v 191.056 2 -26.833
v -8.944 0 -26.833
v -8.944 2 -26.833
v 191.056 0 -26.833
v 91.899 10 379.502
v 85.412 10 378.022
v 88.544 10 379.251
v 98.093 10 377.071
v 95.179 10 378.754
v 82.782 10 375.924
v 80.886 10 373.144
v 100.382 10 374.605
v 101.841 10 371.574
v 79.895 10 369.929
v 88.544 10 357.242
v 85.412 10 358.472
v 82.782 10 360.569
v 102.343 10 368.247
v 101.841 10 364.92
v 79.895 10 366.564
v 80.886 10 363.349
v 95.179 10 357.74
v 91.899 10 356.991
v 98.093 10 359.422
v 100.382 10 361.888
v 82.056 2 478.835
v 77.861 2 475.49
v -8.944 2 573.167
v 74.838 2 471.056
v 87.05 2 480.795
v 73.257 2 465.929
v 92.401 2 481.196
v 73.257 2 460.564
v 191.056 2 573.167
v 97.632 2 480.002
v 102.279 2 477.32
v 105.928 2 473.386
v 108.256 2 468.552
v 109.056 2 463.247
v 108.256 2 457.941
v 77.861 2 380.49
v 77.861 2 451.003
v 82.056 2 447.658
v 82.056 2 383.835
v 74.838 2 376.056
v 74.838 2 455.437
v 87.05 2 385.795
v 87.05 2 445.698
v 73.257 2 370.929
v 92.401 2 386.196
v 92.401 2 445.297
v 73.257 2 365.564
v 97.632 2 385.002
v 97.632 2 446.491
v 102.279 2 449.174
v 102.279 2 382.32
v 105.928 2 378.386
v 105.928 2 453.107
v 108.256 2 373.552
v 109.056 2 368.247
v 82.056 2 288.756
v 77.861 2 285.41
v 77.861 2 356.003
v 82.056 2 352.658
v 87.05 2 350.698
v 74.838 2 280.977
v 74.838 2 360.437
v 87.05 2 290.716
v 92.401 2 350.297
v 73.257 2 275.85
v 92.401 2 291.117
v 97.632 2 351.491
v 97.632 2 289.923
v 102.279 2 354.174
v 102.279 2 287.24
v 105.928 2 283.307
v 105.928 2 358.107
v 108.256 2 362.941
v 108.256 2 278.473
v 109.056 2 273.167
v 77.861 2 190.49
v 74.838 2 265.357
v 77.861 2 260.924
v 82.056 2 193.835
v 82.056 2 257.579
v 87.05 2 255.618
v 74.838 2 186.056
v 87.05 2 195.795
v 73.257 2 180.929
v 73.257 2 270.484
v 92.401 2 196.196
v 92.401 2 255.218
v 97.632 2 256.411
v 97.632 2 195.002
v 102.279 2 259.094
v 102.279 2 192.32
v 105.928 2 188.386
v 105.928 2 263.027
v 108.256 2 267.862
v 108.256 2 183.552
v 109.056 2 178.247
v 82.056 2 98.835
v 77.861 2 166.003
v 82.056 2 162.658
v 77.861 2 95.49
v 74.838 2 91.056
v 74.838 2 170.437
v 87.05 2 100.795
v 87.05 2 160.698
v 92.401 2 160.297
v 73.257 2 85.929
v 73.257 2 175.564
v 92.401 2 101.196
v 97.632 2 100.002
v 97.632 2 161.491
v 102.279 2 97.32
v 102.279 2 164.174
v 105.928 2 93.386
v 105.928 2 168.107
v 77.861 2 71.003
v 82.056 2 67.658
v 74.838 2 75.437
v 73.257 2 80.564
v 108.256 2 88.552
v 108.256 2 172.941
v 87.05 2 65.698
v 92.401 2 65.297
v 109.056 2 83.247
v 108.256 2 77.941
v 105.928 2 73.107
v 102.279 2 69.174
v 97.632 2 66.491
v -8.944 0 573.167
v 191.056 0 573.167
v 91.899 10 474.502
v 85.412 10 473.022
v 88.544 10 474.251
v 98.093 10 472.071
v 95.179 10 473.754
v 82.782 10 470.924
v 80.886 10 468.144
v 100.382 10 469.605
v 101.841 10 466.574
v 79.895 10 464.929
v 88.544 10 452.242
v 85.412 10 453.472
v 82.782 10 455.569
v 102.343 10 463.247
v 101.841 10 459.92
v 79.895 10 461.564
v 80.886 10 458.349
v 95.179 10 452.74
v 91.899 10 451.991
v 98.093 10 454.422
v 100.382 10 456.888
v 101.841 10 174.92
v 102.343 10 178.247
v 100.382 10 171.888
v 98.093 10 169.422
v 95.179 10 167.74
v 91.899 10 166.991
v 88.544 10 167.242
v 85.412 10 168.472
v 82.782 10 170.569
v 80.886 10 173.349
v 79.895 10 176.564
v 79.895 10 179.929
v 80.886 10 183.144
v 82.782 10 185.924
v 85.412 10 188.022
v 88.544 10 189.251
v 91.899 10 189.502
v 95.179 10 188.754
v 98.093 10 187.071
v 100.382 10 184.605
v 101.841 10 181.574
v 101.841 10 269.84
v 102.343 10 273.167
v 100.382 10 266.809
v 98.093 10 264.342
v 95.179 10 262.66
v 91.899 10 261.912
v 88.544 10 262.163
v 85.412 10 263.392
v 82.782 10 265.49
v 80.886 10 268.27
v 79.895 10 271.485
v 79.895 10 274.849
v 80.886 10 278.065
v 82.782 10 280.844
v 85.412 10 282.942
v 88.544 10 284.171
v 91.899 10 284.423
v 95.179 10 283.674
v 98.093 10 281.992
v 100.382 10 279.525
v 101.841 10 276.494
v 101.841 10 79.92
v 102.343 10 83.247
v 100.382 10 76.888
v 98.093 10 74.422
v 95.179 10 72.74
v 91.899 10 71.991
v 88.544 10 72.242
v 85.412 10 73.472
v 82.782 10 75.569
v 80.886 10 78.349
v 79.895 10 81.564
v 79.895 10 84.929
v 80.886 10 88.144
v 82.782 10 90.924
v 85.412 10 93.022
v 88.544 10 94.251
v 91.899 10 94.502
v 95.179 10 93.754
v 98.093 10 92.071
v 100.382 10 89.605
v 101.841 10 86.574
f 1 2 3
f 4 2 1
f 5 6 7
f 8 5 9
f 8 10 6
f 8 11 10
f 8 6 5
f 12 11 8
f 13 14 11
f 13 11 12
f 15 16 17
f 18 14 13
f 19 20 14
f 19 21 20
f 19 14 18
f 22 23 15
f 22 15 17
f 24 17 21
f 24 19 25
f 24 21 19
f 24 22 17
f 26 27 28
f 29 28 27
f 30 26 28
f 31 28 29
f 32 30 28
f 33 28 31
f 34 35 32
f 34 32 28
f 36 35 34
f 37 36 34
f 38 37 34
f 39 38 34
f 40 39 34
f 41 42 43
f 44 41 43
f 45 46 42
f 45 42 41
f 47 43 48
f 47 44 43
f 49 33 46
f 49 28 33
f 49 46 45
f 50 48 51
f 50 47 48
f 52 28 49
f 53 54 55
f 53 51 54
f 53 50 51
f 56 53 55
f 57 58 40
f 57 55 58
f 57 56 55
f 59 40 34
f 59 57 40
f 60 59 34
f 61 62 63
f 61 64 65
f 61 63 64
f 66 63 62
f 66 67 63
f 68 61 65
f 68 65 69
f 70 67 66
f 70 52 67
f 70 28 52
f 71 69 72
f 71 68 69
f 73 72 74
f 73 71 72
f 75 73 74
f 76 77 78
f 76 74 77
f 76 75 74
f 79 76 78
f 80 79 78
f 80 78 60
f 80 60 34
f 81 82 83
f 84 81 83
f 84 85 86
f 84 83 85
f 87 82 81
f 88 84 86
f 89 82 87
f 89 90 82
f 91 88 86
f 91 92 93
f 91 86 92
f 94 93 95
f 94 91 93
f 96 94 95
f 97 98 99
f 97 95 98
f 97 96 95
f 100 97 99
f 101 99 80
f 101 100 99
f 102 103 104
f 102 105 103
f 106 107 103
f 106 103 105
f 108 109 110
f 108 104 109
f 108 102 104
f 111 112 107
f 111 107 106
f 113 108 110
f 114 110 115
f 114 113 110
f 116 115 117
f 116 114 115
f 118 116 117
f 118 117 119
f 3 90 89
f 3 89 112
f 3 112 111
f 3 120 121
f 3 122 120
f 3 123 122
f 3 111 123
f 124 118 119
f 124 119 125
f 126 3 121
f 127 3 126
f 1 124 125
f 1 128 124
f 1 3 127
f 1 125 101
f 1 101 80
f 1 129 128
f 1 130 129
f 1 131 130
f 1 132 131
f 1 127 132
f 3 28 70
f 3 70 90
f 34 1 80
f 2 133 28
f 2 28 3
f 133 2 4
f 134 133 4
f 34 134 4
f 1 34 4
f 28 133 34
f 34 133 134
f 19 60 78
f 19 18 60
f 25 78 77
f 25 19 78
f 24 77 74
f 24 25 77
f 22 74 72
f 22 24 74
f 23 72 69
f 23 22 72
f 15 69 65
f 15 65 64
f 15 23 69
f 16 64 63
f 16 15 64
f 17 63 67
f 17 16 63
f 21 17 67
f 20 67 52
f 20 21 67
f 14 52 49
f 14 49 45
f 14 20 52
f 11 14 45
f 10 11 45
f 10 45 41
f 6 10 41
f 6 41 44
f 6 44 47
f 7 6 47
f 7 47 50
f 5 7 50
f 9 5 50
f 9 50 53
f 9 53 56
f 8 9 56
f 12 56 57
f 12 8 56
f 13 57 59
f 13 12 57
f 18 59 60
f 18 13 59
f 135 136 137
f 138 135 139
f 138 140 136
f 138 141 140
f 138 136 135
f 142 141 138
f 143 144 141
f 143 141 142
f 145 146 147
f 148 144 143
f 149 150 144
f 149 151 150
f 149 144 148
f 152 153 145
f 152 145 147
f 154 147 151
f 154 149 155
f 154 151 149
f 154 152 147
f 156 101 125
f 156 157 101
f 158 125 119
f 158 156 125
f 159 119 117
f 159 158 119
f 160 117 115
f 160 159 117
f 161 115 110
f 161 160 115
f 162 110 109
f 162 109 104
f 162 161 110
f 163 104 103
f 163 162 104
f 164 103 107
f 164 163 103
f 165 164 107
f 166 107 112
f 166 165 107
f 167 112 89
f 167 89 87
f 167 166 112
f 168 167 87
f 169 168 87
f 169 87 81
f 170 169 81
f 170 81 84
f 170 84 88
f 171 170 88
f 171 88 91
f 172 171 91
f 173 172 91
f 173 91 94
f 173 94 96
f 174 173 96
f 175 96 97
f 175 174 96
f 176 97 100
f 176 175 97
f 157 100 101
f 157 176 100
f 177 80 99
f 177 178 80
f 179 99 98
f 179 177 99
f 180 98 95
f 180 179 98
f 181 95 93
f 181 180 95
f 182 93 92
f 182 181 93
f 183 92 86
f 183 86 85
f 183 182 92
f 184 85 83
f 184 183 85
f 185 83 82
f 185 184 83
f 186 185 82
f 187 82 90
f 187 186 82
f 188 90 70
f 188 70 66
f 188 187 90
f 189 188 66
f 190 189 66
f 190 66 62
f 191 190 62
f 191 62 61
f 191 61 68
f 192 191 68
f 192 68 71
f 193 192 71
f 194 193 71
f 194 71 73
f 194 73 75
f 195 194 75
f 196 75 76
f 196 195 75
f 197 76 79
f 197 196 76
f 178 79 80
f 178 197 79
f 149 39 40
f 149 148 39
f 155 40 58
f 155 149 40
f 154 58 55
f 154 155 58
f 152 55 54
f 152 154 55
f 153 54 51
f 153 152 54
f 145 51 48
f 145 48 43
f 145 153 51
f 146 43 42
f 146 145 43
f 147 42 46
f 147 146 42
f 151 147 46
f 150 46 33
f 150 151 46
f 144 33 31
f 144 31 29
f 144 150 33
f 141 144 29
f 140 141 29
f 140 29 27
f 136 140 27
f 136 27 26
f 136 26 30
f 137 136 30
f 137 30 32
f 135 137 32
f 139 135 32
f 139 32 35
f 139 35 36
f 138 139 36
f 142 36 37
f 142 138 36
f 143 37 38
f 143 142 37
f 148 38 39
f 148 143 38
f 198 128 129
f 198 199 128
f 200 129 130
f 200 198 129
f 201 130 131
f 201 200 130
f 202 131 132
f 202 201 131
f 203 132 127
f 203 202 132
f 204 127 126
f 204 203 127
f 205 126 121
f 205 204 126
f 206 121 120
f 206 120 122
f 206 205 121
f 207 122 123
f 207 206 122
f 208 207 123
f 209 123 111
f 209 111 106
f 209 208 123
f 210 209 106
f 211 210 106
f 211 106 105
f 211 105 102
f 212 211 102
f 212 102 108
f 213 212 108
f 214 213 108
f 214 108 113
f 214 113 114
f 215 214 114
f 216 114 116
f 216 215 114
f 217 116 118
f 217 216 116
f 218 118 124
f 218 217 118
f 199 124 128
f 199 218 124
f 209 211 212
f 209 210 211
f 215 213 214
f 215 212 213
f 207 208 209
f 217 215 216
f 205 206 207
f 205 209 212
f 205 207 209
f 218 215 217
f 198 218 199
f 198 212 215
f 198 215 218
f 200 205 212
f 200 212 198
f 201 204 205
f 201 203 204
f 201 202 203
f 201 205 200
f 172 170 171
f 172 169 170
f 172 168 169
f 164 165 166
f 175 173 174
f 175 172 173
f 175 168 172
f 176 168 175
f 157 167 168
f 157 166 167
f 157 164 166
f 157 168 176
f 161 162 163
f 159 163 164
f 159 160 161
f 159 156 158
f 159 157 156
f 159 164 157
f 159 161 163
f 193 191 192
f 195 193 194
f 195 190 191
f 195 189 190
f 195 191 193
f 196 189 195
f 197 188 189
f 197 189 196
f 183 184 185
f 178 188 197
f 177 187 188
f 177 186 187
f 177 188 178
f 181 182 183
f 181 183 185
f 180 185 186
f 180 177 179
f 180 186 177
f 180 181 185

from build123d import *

# Parameters (mm, degrees)
SKETCH1_W           = 200
SKETCH1_H           = 600
BOSS_EXTRUDE1_DEPTH = 2
SKETCH3_R           = 18
BOSS_EXTRUDE2_DEPTH = 8
BOSS_EXTRUDE2_TAPER = 40


with BuildPart() as part:
    # Sketch1 → Boss-Extrude1 (new body)
    with BuildSketch(Plane(origin=(0, 0, 0), x_dir=(1, 0, 0), z_dir=(0, 1, 0))):
        with Locations((91.05572809, -273.16718427)):
            Rectangle(SKETCH1_W, SKETCH1_H)
    extrude(amount=BOSS_EXTRUDE1_DEPTH)

    # Sketch3 → Boss-Extrude2 (add)
    with BuildSketch(Plane(origin=(0, 2, 0), x_dir=(1, 0, 0), z_dir=(0, 1, 0))):
        with Locations((91.05572809, -83.246549225)):
            Circle(SKETCH3_R)
        with Locations((91.05572809, -178.246549225)):
            Circle(SKETCH3_R)
        with Locations((91.05572809, -273.16718427)):
            Circle(SKETCH3_R)
        with Locations((91.05572809, -368.246549225)):
            Circle(SKETCH3_R)
        with Locations((91.05572809, -463.246549225)):
            Circle(SKETCH3_R)
    extrude(amount=BOSS_EXTRUDE2_DEPTH, taper=BOSS_EXTRUDE2_TAPER)


solid = part.part
